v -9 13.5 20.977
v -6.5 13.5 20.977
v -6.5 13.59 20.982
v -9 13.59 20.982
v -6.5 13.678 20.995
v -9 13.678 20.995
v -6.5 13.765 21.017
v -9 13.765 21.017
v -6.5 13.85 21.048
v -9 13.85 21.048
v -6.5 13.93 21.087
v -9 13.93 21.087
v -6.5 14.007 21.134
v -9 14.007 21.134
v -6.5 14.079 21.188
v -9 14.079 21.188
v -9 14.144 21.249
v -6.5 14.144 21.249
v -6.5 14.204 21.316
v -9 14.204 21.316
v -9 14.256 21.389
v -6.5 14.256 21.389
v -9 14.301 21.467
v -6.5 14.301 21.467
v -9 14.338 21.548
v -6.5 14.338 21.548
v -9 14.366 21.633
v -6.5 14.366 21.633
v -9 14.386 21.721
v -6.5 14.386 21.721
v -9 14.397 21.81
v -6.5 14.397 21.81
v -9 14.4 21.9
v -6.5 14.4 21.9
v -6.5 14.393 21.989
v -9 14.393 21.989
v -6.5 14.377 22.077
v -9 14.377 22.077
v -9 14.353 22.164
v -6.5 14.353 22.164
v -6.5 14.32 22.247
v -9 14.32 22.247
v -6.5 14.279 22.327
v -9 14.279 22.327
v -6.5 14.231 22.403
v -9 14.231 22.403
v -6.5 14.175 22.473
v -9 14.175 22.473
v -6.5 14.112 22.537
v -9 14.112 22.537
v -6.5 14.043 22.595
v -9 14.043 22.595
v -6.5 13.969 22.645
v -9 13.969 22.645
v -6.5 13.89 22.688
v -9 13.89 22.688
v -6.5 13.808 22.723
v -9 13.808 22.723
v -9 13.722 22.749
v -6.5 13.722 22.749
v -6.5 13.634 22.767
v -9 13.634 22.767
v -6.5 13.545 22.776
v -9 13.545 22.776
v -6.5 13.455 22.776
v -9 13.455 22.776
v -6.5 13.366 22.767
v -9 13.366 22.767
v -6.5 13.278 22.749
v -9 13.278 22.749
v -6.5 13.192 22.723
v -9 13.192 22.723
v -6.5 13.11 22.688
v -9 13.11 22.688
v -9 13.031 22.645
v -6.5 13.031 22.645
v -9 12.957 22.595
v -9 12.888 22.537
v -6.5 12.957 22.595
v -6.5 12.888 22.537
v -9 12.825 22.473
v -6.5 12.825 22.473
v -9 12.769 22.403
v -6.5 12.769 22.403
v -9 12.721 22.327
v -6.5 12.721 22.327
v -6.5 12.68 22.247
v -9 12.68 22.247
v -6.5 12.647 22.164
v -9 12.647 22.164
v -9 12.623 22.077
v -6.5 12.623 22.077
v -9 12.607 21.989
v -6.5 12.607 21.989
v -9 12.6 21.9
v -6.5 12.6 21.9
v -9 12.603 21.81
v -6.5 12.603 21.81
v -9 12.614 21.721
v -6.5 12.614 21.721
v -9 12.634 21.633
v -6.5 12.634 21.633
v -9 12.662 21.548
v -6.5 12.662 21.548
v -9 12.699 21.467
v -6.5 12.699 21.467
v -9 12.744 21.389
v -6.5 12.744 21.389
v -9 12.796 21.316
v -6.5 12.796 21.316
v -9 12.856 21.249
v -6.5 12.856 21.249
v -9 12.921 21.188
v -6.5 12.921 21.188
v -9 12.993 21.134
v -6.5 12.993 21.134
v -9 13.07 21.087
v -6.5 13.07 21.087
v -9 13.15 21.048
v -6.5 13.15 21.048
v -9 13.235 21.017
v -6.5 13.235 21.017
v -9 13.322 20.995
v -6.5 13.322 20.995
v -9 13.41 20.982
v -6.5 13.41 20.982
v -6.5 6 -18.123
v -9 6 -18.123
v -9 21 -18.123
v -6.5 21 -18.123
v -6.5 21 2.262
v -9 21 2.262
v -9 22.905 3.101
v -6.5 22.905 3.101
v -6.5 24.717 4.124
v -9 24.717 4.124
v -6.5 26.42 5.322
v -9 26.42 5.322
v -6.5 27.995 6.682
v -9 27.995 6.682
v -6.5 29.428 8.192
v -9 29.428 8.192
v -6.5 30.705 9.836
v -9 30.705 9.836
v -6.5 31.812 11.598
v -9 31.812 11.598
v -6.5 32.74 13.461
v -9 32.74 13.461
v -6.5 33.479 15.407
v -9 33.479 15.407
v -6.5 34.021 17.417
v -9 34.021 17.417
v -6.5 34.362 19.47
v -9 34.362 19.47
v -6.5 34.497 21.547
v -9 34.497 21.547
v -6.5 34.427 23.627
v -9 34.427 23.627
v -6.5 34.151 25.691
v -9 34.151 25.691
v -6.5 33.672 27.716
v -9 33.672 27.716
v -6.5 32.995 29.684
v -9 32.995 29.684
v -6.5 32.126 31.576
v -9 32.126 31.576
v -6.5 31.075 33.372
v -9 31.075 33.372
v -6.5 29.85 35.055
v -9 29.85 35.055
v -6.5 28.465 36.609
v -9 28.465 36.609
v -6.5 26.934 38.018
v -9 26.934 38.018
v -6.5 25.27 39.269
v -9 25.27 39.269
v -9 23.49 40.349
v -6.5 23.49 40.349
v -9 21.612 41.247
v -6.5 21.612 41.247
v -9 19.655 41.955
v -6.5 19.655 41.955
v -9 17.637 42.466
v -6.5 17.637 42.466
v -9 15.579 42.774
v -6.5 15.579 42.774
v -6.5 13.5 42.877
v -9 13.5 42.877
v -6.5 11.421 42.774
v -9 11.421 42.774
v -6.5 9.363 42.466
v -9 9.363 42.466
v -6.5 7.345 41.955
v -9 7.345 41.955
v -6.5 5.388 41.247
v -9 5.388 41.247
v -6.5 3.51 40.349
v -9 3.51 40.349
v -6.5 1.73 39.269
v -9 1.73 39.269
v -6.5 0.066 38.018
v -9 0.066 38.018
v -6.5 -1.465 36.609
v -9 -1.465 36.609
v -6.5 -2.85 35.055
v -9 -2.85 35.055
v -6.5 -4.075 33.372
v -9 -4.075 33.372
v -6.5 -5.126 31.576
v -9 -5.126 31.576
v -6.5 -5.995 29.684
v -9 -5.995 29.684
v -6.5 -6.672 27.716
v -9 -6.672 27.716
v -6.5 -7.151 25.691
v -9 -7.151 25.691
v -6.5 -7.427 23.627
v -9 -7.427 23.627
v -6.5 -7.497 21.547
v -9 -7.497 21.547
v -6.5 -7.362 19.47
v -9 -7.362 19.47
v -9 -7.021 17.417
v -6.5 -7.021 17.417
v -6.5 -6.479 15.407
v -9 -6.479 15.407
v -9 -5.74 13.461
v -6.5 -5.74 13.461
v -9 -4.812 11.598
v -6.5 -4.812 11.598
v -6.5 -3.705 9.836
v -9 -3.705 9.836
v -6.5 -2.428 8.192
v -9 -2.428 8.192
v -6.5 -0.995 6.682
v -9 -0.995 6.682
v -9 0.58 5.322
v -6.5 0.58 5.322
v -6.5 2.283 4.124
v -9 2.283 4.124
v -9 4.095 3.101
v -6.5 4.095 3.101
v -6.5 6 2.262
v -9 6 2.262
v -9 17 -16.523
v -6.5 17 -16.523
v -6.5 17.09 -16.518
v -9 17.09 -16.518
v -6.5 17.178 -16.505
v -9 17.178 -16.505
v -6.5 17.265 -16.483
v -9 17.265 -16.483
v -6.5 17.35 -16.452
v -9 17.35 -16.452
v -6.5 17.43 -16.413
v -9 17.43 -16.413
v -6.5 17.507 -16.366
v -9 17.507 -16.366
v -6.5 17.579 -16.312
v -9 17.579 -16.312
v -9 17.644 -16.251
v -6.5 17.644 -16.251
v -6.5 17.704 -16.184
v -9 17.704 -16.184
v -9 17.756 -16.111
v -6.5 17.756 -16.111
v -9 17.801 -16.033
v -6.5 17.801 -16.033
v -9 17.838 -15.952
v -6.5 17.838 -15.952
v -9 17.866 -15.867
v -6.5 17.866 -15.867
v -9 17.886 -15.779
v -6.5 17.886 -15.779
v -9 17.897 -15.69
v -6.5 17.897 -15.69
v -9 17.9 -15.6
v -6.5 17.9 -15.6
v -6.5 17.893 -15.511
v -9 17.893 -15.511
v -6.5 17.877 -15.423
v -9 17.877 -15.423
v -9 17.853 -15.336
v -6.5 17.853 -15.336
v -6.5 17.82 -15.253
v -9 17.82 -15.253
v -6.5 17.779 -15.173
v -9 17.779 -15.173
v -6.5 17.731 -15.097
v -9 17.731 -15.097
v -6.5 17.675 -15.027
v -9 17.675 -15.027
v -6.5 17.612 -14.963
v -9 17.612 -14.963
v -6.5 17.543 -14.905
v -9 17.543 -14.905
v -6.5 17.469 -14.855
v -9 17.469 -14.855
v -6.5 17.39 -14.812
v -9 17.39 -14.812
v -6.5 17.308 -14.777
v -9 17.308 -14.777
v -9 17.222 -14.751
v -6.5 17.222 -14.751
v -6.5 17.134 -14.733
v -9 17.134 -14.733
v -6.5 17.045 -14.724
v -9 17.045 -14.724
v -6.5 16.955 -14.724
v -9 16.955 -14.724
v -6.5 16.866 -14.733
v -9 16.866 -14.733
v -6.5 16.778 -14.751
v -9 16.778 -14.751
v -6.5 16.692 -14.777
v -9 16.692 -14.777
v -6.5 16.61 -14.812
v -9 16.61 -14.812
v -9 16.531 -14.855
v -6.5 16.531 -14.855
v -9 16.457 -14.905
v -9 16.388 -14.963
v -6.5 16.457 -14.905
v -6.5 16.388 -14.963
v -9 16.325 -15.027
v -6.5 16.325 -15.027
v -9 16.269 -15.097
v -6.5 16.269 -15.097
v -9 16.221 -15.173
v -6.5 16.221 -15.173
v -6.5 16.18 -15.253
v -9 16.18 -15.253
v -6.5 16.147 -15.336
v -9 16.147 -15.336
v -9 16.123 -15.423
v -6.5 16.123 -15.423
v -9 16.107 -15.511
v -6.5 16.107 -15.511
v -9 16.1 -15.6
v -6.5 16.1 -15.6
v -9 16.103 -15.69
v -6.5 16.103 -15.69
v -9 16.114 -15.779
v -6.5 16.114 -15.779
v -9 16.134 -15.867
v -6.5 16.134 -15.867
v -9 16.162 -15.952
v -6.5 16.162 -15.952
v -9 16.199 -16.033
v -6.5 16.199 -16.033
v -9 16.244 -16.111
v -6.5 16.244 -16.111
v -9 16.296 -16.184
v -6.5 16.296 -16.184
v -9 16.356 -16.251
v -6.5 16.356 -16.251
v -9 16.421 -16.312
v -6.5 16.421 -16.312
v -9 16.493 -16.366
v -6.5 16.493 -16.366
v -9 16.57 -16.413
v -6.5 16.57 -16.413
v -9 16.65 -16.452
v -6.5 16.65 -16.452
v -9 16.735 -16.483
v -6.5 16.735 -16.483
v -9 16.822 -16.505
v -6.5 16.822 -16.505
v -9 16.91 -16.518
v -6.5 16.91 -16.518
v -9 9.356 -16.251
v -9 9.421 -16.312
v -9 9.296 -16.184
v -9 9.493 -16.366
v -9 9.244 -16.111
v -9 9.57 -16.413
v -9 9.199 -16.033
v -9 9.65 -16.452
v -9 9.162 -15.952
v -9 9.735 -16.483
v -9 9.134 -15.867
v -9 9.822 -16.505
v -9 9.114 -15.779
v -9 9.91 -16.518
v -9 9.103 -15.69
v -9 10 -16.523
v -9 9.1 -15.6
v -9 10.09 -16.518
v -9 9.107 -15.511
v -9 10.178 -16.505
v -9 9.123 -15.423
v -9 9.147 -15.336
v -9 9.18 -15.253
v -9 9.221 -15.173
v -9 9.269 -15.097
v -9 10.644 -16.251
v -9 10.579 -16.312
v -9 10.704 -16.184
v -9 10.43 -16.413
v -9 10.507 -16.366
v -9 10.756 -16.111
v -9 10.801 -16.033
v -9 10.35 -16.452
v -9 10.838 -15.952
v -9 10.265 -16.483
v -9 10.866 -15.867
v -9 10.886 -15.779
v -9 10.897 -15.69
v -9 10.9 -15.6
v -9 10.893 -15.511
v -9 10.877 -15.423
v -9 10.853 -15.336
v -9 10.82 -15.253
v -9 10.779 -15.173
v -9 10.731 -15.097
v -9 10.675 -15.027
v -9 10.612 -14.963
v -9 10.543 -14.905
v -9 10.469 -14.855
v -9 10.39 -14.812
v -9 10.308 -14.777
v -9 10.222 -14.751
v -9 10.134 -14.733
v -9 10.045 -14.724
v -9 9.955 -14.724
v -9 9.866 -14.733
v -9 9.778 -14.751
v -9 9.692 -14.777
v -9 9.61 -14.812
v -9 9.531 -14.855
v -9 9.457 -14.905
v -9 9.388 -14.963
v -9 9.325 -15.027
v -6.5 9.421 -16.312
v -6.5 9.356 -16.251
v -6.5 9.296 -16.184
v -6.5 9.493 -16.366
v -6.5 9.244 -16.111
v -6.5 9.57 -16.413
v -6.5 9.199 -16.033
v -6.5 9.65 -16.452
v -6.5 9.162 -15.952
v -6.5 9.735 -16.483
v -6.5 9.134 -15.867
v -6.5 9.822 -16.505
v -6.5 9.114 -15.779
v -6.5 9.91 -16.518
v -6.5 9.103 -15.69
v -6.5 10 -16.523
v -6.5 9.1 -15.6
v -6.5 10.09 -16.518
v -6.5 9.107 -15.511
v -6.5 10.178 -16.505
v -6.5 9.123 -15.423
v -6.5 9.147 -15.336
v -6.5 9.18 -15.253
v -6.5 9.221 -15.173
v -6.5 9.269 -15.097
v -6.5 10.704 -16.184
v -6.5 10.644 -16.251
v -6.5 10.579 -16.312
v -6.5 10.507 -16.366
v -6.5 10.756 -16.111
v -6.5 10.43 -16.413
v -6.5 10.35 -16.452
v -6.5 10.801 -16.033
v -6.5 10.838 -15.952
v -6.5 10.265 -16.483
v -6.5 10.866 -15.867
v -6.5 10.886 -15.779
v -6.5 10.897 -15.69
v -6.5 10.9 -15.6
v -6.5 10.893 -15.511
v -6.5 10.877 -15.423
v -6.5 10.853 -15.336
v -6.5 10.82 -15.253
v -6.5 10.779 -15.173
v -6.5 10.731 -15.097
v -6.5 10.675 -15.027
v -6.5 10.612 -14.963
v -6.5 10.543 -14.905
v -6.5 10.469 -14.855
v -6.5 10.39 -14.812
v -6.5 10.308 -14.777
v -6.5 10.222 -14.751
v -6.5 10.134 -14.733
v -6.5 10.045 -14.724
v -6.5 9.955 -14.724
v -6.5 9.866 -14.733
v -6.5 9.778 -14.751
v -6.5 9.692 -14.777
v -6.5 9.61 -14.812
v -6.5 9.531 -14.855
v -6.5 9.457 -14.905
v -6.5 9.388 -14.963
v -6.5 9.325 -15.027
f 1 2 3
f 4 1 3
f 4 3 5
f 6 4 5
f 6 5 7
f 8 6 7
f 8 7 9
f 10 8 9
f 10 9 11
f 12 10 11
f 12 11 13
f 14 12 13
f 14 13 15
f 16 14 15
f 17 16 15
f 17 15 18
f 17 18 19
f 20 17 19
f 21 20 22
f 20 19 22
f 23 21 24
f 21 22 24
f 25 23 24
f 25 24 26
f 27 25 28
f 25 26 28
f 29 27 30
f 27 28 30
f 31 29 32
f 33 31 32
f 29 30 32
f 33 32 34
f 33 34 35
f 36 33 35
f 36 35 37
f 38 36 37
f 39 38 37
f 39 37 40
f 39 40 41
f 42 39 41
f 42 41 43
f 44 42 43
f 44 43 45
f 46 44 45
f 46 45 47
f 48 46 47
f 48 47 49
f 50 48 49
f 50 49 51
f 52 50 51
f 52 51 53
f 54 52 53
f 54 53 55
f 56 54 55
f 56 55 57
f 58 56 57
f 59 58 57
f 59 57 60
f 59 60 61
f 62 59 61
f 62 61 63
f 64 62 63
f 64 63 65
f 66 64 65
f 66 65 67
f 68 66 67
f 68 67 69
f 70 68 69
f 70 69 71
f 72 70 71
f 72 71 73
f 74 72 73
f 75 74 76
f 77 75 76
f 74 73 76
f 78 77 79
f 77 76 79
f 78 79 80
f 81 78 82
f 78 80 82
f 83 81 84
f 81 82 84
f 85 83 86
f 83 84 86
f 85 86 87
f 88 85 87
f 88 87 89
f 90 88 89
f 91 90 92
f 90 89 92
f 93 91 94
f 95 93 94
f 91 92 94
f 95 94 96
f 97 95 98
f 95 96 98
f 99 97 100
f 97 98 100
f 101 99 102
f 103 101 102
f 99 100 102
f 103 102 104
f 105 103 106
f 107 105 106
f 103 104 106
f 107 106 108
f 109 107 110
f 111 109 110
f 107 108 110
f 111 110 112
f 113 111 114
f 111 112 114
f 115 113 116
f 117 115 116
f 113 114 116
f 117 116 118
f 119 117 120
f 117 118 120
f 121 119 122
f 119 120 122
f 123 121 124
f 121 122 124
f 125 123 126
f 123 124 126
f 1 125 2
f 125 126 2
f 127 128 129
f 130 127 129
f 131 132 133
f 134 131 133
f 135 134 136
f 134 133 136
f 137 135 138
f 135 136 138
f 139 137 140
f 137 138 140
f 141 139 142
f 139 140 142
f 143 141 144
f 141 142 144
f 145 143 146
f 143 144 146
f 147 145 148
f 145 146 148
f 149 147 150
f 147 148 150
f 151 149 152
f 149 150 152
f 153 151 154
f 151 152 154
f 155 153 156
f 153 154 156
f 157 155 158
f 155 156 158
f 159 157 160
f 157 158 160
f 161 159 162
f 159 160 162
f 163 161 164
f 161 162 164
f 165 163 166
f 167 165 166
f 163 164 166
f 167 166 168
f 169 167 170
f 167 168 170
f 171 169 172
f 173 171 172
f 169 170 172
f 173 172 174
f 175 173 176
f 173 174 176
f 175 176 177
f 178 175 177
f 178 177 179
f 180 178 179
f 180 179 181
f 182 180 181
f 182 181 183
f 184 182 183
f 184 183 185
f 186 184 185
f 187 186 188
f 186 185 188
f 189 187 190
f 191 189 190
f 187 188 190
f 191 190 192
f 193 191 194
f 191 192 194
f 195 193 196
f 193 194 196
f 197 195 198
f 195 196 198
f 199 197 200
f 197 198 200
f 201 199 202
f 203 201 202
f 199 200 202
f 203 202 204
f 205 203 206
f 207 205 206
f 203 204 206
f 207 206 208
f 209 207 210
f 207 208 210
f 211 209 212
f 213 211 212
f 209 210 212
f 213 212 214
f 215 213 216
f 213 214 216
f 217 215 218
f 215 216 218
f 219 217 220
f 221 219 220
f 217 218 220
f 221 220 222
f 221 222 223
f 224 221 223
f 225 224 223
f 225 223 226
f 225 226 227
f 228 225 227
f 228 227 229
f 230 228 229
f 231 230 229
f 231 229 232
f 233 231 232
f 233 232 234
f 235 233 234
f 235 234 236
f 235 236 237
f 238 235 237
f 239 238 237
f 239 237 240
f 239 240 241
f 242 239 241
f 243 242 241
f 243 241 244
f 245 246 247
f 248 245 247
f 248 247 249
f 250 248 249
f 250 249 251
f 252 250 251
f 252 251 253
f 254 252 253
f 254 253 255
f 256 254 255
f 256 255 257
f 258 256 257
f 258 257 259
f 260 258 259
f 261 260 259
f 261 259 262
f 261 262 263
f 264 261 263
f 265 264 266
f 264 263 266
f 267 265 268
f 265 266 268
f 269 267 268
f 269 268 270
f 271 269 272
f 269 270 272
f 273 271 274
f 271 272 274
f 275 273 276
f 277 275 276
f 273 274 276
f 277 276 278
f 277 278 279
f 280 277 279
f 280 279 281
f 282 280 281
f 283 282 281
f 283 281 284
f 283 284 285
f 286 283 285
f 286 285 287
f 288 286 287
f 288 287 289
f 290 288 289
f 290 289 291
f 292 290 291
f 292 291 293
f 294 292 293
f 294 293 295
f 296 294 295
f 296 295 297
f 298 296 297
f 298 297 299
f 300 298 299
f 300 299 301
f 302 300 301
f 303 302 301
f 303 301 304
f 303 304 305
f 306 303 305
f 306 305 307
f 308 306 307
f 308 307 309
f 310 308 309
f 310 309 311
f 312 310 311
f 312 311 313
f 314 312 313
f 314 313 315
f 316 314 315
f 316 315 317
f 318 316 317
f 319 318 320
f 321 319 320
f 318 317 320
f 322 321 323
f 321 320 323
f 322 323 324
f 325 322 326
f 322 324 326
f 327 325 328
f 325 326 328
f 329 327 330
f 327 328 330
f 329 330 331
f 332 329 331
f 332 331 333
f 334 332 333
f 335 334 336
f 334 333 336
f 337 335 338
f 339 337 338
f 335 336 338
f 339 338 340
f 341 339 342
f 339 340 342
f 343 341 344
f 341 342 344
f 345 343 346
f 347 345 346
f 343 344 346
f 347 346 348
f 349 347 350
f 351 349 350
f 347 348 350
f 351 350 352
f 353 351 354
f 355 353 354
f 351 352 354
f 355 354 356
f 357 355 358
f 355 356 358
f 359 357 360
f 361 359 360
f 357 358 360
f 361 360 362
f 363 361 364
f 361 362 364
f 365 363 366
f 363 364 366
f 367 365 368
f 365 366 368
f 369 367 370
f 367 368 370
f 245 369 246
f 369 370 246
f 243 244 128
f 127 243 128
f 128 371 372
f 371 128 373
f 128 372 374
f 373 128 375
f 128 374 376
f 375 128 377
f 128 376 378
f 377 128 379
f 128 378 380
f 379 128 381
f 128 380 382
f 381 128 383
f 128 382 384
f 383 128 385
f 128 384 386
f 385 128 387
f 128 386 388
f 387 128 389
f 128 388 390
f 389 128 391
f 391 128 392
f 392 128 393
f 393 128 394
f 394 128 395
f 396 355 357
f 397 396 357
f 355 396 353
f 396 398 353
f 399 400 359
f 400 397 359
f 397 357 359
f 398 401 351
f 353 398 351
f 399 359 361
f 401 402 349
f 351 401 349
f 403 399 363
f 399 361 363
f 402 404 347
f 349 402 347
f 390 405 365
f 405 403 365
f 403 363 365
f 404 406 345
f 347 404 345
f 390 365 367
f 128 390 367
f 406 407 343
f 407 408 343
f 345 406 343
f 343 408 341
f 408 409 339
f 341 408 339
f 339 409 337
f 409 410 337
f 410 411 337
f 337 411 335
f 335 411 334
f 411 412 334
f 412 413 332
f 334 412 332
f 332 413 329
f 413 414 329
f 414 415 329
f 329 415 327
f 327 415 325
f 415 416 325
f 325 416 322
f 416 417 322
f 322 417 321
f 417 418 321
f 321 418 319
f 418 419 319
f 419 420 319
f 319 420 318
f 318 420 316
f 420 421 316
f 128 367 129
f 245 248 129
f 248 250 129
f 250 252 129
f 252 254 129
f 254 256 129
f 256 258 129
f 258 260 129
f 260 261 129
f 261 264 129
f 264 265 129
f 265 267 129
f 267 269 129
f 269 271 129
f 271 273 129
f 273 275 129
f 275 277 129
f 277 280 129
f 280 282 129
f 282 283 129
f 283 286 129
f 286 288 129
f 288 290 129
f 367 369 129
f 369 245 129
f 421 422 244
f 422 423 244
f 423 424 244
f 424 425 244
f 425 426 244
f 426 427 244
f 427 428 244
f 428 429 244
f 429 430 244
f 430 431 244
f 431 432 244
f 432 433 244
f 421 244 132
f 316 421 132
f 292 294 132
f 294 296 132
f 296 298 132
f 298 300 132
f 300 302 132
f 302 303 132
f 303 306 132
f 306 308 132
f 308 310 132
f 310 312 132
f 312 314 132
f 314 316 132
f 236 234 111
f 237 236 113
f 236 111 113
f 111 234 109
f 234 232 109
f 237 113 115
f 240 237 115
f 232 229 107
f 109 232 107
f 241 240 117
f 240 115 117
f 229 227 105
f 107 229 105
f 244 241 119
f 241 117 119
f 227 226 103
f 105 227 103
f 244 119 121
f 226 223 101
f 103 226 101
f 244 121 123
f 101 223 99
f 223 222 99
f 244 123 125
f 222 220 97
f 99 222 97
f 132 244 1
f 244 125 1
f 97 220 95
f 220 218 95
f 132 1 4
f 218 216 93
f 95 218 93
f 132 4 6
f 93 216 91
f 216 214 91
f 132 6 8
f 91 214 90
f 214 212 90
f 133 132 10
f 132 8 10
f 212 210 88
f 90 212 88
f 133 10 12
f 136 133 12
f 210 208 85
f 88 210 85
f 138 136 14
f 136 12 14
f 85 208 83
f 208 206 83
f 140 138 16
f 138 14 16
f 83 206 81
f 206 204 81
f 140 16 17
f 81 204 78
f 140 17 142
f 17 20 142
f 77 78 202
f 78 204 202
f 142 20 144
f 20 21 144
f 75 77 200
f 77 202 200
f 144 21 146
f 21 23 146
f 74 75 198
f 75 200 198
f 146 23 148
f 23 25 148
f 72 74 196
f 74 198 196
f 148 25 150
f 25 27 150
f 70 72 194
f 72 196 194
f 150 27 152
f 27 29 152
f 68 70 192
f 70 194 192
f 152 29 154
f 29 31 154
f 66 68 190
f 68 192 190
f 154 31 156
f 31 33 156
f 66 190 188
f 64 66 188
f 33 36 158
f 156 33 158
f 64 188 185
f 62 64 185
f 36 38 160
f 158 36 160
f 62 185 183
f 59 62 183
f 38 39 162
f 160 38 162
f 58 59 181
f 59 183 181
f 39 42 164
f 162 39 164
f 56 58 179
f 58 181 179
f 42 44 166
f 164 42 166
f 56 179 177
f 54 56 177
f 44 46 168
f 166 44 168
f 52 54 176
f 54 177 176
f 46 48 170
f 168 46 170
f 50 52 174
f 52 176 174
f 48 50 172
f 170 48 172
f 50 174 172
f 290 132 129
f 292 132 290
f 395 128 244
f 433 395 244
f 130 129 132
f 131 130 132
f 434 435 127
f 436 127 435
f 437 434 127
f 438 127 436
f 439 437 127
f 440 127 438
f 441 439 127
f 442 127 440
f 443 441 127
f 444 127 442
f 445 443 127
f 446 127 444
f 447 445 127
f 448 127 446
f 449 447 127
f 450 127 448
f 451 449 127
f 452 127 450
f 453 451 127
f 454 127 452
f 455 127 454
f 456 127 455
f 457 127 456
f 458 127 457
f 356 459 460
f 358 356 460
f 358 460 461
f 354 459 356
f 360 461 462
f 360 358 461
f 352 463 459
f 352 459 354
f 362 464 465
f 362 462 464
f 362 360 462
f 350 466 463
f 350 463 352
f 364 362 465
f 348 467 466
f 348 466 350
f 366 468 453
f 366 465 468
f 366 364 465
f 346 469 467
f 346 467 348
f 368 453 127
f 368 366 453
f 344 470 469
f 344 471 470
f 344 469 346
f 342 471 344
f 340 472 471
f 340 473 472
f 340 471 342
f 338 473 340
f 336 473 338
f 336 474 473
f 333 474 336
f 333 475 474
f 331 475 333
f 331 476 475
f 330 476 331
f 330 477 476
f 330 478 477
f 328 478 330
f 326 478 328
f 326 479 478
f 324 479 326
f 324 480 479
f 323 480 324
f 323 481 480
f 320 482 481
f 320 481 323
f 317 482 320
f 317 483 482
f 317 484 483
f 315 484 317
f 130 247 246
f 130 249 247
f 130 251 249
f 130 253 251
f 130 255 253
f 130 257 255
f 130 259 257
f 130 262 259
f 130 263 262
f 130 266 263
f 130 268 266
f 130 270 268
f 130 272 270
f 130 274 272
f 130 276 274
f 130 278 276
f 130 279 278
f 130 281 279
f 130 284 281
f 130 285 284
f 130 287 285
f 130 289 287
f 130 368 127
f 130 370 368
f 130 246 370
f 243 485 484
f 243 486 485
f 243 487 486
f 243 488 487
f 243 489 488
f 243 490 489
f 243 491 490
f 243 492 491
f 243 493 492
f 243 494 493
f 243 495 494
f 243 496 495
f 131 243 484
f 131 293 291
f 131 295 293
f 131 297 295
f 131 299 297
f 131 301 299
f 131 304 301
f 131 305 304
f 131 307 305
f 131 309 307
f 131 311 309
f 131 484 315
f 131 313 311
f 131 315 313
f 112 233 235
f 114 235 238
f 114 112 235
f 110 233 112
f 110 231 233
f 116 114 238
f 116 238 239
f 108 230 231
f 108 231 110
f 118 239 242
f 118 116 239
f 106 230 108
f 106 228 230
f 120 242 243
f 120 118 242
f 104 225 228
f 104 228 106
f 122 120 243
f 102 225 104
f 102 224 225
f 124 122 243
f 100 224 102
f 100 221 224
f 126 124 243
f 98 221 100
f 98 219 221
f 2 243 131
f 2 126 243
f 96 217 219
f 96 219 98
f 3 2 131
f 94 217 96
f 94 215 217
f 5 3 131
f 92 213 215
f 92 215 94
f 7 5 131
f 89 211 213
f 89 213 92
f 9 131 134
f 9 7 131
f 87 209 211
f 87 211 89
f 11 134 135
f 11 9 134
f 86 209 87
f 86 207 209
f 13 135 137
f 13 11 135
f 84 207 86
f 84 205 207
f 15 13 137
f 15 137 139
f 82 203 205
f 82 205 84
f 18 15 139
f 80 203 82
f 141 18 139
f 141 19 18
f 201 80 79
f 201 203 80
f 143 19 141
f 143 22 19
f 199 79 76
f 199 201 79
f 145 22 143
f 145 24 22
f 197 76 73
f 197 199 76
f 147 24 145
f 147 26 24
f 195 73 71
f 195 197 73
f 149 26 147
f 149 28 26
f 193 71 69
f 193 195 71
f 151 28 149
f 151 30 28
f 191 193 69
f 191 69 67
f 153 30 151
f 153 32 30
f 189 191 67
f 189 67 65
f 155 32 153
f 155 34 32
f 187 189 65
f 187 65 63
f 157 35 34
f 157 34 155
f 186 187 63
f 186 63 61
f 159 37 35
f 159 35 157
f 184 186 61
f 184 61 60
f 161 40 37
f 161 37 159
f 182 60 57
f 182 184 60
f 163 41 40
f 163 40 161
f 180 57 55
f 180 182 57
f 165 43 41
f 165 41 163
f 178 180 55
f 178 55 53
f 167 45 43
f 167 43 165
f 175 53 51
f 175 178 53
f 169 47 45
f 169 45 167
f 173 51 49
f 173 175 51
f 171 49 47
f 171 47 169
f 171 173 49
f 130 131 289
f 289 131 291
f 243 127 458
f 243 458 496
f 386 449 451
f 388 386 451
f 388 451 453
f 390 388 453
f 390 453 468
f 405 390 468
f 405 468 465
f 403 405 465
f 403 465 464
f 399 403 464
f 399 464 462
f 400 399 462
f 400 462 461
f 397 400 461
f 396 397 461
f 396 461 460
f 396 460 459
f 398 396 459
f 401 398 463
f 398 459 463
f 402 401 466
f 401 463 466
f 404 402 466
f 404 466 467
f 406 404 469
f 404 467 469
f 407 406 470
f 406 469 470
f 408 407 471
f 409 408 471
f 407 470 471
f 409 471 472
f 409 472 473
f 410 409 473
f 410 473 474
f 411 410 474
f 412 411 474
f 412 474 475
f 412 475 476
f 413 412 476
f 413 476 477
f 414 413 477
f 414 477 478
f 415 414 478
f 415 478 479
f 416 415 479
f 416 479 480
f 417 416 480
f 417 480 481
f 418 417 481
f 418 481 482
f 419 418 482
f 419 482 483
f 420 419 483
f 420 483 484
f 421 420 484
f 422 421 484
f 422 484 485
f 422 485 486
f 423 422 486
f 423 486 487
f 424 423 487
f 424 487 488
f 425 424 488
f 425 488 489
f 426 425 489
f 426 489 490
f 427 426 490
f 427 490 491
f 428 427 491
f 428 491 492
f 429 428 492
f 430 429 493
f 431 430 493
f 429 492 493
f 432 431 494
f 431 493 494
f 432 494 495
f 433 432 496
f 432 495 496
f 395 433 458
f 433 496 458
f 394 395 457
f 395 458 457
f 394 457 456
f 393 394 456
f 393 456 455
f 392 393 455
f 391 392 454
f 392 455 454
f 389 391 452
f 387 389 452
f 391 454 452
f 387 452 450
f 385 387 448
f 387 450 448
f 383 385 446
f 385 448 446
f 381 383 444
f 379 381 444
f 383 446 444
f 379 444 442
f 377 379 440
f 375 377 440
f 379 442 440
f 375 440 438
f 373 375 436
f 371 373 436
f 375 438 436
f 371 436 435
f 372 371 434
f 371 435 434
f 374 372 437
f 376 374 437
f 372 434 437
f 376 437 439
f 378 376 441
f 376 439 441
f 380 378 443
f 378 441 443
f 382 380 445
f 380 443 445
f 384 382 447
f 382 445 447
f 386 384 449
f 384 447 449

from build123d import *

# Parameters (mm, degrees)
EXTRUDE_1_DEPTH     = 2.5
SKETCH_2_R          = 0.9
CUT_EXTRUDE_1_DEPTH = 3.5


with BuildPart() as part:
    # 스케치1 → 보스-돌출1 (new body)
    with BuildSketch(Plane(origin=(-9, 0, 0), x_dir=(0, -1, 0), z_dir=(-1, 0, 0))):
        with BuildLine():
            Line((-21, -18.122865071), (-21, 2.262089683))
            ThreePointArc((-21, 2.262089683), (-13.5, 42.877134929), (-6, 2.262089683))
            Line((-6, 2.262089683), (-6, -18.122865071))
            Line((-6, -18.122865071), (-21, -18.122865071))
        make_face()
    extrude(amount=-EXTRUDE_1_DEPTH)

    # 스케치2 → 컷-돌출1 (cut, through all)
    with BuildSketch(Plane(origin=(-6.5, 0, 0), x_dir=(0, 0, -1), z_dir=(1, 0, 0))):
        with Locations((15.622865071, 10)):
            Circle(SKETCH_2_R)
        with Locations((15.622865071, 17)):
            Circle(SKETCH_2_R)
        with Locations((-21.877134929, 13.5)):
            Circle(SKETCH_2_R)
    extrude(amount=-CUT_EXTRUDE_1_DEPTH, mode=Mode.SUBTRACT)


solid = part.part
